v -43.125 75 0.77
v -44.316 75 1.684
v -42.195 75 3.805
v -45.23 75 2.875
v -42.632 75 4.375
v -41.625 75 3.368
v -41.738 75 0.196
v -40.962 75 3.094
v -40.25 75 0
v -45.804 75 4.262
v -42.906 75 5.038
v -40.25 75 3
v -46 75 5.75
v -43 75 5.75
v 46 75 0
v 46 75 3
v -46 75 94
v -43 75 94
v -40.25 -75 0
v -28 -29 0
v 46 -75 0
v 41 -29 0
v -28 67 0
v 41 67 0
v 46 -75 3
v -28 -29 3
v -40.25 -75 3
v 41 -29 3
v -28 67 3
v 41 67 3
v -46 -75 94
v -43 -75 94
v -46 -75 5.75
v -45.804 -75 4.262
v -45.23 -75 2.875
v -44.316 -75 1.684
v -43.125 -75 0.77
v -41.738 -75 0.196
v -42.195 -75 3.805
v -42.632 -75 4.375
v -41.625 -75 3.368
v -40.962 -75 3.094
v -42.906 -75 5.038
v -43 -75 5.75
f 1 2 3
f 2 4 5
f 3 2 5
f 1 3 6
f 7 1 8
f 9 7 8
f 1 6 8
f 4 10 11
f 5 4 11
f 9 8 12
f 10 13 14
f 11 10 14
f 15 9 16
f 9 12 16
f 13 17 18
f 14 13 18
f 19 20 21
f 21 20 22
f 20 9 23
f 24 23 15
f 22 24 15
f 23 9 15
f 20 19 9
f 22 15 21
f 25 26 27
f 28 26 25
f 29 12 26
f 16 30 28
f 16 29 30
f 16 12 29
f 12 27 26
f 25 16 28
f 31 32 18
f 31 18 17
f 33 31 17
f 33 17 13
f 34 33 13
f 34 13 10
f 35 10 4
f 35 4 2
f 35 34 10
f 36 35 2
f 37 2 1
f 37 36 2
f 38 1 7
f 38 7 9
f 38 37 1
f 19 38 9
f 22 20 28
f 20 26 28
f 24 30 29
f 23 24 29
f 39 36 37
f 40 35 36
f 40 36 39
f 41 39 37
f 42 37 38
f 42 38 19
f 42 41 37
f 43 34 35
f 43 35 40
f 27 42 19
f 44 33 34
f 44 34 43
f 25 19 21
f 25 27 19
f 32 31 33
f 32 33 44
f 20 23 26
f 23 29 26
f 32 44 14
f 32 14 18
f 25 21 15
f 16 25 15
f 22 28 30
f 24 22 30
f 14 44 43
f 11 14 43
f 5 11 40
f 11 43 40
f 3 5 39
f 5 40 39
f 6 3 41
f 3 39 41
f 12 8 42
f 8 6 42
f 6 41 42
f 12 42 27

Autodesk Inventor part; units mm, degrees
ref_plane "YZ Plane" through (0, 0, 0) normal (1, 0, 0) x (0, 1, 0)
ref_plane "XZ Plane" through (0, 0, 0) normal (0, 1, 0) x (-1, 0, 0)
ref_plane "XY Plane" through (0, 0, 0) normal (0, 0, 1) x (1, 0, 0)
sketch "Sketch1" plane through (0, 0, 0) normal (0, 0, 1) x (1, 0, 0)
  line L0 (-46, -75) -> (46, -75)
  line L1 (46, -75) -> (46, 75)
  line L2 (46, 75) -> (-46, 75)
  line L3 (-46, 75) -> (-46, -75)
  line L4 (-46, -75) -> (46, 75) construction
  line L5 (46, -75) -> (-46, 75) construction
  point P0 (0, 0)
  dimension "d154" = 92
  dimension "d155" = 150
extrude "Plate5" add sketch "Sketch1" along normal blind 3
sketch "Sketch7" plane through (-43, -75, 0) normal (-1, 0, 0) x (0, -1, 0)
  line L0 (-150, 0) -> (0, 0)
  line L1 (0, 0) -> (0, 94)
  line L2 (0, 94) -> (-150, 94)
  line L3 (-150, 94) -> (-150, 0)
edge flange "Flange3" height 94 angle 90 thickness 3 bend radius 2.75 thickness toward (-1, 0, 0) relief round relief width 3 relief depth 1.5 edges at (-46, 0, 3) wall of the first edge with corners at (-43, 75, 0) (-43, -75, 0) (-43, -75, 94) (-43, 75, 94)
bend "Bend3"
corner "Corner3"
sketch "Sketch8" plane through (0, 0, 3) normal (0, 0, 1) x (1, 0, 0)
  line L0 (46, 75) -> (46, -75) projected
  line L1 (-40.25, 75) -> (46, 75) projected
  line L2 (41, 67) -> (-28, 67)
  line L3 (-28, 67) -> (-28, -29)
  line L4 (-28, -29) -> (41, -29)
  line L5 (41, -29) -> (41, 67)
  line L6 (41, 67) -> (-28, -29) construction
  line L7 (-28, 67) -> (41, -29) construction
  line L8 (-40.25, 75) -> (-43, 75) projected
  point P0 (0, 0)
  point P1 (6.5, 19)
  point P2 (2.875, 75)
  point P3 (-41.625, 75)
  dimension "d167" = 69
  dimension "d168" = 96
  dimension "d169" = 8
  dimension "d174" = 13.625
  dimension "d175" = 5
extrude "Cut1" cut sketch "Sketch8" against normal blind 3
properties part number "PNS 752 FDS 1200 FLANGE 2" material "Stainless Steel"
